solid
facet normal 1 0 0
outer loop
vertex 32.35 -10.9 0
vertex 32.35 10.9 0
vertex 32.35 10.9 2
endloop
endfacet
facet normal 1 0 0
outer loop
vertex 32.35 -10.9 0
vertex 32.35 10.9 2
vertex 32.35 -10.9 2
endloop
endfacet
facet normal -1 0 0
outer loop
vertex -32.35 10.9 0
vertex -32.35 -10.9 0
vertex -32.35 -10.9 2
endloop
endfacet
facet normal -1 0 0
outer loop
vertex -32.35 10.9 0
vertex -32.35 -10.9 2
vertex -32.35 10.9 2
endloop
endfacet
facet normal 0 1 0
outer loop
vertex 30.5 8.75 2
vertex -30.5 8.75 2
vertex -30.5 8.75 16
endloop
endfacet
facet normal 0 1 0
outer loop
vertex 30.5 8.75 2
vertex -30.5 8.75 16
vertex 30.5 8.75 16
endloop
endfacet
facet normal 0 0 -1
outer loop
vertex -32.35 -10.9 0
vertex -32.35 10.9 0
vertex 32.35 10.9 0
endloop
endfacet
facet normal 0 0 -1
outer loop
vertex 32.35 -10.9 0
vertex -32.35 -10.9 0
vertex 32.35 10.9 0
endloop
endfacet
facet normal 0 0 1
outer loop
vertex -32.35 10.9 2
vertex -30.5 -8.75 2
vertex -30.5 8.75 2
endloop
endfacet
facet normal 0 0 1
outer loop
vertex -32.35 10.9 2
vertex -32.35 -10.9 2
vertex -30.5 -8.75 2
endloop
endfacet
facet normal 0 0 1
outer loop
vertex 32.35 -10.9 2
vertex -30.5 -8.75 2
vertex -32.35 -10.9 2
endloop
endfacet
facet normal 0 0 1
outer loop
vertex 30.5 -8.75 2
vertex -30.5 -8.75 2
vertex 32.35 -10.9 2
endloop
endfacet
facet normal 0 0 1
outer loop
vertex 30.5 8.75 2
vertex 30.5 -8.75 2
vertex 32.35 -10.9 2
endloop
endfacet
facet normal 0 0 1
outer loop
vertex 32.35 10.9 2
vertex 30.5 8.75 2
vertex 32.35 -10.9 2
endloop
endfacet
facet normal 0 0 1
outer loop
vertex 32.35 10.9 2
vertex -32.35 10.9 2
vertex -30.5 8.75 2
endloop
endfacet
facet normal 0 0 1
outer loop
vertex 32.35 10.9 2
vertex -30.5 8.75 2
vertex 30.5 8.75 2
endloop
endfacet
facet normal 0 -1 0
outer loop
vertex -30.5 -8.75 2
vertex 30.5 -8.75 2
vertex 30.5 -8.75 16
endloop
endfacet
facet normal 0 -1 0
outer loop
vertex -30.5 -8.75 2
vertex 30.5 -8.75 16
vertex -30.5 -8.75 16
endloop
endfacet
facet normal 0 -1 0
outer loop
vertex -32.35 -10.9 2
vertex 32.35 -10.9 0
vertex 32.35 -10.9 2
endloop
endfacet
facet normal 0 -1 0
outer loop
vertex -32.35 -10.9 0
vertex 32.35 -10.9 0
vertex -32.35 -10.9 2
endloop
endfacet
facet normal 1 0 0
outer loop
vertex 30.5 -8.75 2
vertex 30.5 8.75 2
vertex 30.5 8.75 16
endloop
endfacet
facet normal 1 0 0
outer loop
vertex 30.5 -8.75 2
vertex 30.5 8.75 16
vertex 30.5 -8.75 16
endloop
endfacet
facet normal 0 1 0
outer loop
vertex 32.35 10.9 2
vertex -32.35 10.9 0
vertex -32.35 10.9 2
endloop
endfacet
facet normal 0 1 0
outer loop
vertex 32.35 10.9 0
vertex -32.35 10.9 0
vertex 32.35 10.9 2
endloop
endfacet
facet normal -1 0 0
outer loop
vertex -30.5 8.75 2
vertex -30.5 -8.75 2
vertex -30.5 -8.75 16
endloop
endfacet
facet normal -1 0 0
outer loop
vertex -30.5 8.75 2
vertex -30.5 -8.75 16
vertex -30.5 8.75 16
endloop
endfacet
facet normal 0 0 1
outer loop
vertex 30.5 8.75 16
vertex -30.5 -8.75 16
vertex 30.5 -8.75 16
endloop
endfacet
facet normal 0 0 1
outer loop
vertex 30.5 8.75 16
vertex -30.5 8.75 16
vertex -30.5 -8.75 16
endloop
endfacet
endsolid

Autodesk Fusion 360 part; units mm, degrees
sketch "Esquisse1" plane through (0, 0, 0) normal (0, 0, 1) x (1, 0, 0)
  line L0 (-30.5, 8.75) -> (30.5, 8.75)
  line L1 (30.5, 8.75) -> (30.5, -8.75)
  line L2 (30.5, -8.75) -> (-30.5, -8.75)
  line L3 (-30.5, -8.75) -> (-30.5, 8.75)
  line L4 (-32.35, 10.9) -> (32.35, 10.9)
  line L5 (32.35, 10.9) -> (32.35, -10.9)
  line L6 (32.35, -10.9) -> (-32.35, -10.9)
  line L7 (-32.35, -10.9) -> (-32.35, 10.9)
  dimension "d1" = 61
  dimension "d2" = 17.5
  dimension "d3" = 30.5
  dimension "d4" = 8.75
  dimension "d5" = 64.7
  dimension "d6" = 21.8
  dimension "d7" = 32.35
  dimension "d8" = 10.9
extrude "Extrusion1" add sketch "Esquisse1" along normal blind 16 contours L0 L1 L2 L3
extrude "Extrusion2" add sketch "Esquisse1" along normal blind 2
